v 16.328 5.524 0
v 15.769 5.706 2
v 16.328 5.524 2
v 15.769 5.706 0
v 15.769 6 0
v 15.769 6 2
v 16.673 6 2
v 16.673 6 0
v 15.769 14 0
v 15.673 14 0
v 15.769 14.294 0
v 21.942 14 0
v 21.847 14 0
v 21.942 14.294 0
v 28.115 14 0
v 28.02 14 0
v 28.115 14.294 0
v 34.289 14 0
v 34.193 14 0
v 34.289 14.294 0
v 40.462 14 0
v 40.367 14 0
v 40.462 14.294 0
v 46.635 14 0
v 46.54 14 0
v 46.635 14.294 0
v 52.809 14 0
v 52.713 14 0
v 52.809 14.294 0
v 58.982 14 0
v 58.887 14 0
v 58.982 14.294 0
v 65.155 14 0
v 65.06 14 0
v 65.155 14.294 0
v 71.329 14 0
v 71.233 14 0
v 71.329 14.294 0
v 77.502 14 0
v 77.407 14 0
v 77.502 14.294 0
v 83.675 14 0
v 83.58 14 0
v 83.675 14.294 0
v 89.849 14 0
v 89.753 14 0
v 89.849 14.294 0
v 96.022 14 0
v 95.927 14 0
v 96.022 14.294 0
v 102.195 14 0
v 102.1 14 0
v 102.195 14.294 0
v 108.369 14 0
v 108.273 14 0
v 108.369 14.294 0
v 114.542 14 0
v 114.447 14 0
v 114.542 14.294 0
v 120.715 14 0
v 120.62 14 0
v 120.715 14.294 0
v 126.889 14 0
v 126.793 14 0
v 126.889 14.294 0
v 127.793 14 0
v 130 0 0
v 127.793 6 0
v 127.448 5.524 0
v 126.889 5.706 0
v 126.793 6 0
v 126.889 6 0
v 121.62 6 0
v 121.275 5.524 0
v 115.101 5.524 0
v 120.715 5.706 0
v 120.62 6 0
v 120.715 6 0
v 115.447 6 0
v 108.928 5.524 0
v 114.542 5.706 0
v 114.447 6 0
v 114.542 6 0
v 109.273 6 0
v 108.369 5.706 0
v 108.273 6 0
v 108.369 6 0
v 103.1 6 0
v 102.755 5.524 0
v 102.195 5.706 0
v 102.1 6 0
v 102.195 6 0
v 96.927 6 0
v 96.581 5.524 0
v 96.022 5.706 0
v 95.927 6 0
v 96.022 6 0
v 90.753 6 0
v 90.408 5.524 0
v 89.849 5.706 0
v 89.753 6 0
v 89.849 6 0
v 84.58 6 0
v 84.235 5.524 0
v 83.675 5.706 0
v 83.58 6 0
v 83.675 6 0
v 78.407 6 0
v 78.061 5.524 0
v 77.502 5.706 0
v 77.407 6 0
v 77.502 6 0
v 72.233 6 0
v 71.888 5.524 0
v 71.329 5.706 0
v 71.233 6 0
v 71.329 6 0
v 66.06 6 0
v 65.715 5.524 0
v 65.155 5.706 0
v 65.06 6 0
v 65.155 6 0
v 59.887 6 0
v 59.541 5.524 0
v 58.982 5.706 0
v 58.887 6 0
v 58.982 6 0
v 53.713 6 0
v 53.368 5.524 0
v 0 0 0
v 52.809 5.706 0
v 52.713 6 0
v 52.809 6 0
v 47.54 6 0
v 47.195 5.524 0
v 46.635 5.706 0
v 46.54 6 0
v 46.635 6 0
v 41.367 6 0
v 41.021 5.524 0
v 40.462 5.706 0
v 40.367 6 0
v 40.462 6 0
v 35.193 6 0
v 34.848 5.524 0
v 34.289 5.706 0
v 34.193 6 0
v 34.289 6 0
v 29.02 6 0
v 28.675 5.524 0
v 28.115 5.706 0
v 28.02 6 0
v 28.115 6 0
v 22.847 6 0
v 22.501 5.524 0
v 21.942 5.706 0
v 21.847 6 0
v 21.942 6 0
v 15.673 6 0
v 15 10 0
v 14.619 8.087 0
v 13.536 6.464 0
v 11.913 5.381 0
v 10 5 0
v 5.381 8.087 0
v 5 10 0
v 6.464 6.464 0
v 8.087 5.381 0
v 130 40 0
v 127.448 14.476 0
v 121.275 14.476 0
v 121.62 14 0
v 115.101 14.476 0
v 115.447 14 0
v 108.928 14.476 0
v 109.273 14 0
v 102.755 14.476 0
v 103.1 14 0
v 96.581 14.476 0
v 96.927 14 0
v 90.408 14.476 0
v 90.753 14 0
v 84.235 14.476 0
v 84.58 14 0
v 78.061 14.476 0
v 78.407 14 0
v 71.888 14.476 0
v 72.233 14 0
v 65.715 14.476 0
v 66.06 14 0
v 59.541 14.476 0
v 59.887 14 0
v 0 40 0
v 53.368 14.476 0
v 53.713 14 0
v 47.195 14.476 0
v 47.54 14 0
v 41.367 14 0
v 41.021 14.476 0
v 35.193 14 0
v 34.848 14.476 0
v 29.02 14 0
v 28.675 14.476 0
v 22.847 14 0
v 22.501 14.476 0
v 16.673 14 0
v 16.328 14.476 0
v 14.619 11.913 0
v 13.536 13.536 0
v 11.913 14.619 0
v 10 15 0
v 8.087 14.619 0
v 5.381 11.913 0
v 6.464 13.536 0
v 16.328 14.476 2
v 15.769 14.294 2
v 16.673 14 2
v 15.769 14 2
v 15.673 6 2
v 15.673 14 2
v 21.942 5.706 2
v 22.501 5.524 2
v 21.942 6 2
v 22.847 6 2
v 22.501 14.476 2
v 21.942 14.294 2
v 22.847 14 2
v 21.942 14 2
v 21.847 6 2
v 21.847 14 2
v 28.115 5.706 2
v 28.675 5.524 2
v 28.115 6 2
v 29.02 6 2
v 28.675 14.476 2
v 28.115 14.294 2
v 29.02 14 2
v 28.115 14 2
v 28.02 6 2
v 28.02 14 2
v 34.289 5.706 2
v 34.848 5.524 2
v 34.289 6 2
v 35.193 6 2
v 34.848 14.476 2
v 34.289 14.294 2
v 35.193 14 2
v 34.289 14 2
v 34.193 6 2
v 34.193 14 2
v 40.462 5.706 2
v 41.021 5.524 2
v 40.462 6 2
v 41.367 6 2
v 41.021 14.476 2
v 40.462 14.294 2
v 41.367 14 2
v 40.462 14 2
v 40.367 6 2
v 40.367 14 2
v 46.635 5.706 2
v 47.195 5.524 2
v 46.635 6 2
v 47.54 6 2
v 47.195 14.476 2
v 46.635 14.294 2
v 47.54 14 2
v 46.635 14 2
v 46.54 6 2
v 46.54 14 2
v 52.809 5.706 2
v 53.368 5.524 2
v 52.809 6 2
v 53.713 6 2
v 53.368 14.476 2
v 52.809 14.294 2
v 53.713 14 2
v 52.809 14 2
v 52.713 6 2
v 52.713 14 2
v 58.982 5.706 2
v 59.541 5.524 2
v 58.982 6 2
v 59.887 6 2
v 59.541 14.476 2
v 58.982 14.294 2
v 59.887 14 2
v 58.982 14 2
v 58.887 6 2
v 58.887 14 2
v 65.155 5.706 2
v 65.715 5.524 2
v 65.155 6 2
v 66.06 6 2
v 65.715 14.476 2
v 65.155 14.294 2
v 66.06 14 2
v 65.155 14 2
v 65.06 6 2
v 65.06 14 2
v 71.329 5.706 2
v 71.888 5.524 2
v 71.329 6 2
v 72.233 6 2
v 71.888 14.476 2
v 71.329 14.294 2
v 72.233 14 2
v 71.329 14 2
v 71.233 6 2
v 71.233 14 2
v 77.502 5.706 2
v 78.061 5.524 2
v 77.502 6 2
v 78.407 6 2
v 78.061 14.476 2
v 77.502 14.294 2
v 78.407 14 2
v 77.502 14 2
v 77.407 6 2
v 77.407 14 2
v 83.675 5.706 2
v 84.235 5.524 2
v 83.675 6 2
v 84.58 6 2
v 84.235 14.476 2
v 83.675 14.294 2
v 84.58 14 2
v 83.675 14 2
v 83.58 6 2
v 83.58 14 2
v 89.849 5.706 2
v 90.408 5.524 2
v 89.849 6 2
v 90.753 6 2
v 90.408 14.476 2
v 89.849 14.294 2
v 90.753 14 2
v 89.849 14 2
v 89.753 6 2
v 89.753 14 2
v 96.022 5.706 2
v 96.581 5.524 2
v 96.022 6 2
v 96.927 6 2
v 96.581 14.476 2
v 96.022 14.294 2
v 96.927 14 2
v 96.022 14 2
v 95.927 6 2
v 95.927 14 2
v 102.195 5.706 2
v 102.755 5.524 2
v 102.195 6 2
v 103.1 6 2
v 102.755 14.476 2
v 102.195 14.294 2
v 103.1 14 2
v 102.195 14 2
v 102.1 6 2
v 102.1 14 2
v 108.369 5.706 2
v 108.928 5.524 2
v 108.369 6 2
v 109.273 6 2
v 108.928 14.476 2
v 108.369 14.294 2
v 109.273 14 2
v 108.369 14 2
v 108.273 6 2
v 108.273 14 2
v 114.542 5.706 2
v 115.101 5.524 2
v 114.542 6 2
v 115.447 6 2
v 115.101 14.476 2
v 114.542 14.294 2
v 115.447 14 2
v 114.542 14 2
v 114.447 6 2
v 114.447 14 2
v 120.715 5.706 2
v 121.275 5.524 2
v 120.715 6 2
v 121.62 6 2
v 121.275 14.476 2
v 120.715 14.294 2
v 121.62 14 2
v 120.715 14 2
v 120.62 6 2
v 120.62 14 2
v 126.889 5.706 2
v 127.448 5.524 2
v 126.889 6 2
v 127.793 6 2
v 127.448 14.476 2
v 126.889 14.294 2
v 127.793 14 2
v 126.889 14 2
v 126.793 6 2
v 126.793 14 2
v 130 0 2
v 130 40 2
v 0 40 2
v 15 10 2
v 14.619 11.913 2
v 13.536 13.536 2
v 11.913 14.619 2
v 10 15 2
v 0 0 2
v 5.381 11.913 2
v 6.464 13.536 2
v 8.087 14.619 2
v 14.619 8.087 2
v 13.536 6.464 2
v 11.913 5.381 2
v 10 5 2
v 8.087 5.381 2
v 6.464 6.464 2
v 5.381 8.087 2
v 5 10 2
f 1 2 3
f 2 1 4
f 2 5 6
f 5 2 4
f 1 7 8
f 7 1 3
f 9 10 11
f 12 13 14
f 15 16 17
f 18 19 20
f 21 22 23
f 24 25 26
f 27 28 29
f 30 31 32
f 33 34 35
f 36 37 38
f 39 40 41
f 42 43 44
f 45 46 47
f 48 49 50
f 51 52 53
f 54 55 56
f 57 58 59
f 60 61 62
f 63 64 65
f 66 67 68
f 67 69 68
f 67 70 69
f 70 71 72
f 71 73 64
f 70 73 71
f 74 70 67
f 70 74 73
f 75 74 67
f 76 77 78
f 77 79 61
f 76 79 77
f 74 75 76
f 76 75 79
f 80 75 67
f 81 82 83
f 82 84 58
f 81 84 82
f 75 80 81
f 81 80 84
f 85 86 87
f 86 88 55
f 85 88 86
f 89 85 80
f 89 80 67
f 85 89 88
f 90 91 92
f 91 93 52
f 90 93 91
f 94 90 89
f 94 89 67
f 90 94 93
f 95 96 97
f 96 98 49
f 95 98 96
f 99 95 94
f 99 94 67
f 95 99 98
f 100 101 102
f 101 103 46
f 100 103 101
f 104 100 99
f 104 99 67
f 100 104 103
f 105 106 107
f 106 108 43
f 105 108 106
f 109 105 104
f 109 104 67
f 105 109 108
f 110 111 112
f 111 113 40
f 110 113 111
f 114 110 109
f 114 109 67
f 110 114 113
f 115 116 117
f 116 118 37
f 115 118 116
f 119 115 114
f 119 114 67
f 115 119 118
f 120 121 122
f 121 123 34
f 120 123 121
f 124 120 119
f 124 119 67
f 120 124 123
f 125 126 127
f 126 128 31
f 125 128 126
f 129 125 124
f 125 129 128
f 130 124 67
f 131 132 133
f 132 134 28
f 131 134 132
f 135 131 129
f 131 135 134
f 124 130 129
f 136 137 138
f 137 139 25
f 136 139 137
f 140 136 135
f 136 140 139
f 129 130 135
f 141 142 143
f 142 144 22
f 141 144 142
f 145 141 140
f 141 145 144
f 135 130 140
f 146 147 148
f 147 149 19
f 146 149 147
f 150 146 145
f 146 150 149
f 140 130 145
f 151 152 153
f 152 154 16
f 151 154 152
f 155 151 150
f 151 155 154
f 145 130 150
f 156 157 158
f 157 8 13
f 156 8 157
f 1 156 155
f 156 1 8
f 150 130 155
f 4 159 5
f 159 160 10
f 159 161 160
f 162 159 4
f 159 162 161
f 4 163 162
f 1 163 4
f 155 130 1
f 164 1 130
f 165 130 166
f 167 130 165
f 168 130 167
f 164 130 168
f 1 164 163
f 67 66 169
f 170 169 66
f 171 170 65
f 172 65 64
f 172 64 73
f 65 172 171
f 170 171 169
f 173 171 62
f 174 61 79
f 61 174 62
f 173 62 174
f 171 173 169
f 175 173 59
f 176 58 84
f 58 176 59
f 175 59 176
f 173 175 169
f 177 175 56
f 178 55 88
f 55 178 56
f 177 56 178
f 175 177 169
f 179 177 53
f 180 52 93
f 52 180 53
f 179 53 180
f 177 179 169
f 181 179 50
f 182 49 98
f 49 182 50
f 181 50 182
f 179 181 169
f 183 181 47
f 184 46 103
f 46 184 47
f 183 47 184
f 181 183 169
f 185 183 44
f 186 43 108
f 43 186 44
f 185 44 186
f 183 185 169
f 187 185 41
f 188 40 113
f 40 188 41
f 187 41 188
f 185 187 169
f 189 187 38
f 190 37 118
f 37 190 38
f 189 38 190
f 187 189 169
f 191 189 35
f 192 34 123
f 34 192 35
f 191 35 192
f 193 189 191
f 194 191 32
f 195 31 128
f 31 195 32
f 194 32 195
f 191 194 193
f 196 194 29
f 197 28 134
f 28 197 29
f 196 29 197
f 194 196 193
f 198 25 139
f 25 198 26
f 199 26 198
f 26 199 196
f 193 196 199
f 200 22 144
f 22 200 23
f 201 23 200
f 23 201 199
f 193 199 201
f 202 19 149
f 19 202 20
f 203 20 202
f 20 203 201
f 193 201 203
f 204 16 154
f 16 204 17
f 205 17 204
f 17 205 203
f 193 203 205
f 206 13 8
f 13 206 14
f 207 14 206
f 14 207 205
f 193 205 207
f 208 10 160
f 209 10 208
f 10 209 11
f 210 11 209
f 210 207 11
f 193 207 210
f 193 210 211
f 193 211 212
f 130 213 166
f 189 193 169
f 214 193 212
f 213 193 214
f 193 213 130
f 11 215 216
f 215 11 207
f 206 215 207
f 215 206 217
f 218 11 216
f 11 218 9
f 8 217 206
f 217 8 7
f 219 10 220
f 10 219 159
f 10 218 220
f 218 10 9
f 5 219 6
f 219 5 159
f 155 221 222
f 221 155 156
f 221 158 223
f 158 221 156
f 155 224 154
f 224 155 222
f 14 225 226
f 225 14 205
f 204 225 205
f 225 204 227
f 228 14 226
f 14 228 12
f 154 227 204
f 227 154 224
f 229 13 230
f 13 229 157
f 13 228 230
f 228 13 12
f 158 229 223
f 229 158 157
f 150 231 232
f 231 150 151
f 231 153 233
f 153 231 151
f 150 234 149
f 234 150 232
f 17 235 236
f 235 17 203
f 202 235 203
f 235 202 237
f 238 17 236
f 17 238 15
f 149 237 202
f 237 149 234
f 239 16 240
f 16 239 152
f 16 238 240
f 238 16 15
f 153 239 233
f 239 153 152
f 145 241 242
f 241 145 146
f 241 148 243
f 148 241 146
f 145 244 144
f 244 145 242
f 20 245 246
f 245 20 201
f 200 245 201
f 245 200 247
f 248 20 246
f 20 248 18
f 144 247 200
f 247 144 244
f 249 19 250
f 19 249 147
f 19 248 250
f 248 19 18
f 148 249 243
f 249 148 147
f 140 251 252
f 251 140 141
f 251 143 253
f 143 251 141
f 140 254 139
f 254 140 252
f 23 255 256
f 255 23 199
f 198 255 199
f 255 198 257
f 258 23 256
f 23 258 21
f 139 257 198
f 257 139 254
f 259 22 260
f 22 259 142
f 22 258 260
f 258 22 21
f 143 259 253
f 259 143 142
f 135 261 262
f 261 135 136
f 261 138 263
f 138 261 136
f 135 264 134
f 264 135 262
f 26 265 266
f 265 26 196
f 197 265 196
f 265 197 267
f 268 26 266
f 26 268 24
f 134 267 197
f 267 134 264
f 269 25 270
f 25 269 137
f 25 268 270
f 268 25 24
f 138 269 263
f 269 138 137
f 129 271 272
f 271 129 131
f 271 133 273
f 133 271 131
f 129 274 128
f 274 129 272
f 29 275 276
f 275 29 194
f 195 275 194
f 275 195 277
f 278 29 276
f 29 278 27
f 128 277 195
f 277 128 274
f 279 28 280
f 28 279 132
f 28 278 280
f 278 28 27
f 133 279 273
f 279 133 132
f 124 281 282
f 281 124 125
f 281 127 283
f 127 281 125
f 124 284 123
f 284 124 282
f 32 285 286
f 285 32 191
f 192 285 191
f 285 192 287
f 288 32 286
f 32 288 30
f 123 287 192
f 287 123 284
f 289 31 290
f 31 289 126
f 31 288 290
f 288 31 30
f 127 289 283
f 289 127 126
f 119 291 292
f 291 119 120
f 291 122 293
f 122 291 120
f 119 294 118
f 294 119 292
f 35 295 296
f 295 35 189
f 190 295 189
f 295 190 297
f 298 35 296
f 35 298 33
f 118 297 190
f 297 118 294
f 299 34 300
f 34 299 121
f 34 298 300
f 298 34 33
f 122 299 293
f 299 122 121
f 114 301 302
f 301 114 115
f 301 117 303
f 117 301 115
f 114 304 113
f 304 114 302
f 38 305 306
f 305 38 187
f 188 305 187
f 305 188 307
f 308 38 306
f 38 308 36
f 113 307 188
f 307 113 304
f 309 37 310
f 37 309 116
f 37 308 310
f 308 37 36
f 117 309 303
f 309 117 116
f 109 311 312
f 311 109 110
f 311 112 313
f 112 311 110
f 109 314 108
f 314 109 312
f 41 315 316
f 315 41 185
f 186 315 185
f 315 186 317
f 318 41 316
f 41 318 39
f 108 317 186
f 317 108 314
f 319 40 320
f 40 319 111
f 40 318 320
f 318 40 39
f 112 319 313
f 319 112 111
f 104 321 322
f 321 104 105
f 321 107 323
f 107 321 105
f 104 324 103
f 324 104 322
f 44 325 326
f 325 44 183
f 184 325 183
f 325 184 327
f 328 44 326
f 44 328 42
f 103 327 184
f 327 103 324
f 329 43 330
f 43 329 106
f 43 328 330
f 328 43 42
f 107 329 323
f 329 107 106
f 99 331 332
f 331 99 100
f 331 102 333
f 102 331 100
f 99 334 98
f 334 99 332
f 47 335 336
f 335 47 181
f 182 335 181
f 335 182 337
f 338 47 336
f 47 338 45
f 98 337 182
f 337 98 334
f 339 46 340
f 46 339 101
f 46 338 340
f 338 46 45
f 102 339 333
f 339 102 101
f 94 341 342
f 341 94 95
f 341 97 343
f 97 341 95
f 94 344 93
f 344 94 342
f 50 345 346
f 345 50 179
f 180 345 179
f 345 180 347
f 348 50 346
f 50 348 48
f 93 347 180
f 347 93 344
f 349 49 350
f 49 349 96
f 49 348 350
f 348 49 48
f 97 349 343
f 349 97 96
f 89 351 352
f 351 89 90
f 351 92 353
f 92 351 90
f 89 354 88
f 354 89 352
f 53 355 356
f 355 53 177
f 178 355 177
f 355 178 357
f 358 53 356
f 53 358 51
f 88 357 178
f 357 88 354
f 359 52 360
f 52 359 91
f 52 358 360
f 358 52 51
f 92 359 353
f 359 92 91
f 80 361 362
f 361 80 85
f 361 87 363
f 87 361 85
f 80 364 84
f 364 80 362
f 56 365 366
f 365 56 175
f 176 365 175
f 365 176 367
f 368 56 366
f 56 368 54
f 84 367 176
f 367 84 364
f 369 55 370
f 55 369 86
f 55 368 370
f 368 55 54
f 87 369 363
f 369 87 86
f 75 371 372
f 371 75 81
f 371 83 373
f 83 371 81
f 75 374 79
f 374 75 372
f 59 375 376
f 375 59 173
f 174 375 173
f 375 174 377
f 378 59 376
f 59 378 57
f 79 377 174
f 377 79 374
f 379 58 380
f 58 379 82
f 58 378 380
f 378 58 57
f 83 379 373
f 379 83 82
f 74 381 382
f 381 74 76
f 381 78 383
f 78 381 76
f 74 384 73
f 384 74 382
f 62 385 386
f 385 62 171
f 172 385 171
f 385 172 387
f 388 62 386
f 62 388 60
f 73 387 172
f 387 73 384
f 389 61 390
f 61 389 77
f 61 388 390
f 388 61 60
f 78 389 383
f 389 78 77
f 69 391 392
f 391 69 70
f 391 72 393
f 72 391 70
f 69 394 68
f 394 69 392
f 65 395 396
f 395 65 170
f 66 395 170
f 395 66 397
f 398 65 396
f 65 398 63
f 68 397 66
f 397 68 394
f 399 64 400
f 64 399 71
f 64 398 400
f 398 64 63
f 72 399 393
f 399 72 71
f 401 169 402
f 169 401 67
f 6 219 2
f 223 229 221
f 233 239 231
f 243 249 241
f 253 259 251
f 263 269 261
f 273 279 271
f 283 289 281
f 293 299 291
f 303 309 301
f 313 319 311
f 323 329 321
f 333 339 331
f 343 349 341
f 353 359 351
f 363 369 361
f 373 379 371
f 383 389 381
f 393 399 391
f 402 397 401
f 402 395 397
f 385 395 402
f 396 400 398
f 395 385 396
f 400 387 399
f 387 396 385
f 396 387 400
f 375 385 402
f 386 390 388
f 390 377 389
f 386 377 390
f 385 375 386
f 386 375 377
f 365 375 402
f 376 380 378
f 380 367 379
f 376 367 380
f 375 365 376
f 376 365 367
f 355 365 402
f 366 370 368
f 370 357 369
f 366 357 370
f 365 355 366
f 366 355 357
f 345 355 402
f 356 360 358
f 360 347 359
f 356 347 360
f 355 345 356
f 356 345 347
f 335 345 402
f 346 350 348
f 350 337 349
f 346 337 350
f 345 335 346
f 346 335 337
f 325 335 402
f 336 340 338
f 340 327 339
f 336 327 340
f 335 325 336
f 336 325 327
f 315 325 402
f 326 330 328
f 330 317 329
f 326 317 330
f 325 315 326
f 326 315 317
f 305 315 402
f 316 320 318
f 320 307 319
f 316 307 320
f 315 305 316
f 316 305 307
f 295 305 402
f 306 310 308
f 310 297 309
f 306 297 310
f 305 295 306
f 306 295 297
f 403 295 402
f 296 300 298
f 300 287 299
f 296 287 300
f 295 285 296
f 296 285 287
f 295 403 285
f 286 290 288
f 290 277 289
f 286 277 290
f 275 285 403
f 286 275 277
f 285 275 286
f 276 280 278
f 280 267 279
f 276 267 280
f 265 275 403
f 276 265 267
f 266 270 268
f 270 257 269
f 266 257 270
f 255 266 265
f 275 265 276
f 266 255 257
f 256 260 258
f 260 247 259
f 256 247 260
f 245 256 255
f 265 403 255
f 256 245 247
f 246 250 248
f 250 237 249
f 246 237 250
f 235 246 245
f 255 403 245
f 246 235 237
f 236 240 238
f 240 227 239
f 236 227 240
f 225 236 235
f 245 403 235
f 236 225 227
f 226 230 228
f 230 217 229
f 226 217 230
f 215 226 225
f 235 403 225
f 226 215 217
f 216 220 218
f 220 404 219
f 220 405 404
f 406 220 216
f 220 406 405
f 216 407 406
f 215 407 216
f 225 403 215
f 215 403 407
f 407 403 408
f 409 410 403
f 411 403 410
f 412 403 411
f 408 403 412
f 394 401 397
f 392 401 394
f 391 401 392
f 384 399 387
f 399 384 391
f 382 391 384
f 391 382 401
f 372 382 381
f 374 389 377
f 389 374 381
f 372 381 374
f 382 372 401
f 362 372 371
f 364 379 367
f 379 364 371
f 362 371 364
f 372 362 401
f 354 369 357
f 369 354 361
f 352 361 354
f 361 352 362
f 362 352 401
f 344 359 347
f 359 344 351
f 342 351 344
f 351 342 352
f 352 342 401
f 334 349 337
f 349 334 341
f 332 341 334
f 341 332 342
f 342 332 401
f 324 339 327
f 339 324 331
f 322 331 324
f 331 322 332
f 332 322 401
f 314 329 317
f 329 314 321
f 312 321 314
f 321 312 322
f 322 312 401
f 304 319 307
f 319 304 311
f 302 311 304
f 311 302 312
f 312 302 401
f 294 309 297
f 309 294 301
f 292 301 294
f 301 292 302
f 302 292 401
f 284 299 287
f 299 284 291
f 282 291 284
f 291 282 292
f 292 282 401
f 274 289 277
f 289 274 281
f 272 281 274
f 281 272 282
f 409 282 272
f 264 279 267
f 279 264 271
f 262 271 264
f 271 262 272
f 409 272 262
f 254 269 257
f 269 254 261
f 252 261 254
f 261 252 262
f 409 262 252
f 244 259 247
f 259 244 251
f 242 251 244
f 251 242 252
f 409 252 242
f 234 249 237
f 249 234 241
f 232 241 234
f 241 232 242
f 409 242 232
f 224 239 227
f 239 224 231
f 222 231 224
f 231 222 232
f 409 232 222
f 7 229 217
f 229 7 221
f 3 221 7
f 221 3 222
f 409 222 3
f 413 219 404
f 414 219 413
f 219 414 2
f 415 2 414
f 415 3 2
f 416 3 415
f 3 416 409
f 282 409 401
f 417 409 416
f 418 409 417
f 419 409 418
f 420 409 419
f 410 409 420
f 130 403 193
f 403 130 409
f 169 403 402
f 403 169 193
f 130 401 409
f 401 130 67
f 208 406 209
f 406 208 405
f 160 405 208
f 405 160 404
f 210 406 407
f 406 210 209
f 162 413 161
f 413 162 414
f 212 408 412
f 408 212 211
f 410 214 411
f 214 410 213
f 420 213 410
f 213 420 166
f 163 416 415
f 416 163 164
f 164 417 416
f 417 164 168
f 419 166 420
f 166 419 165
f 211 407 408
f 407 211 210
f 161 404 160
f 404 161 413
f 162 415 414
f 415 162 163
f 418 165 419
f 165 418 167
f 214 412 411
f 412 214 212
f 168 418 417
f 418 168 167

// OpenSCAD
ruler_size_lengh=130;
ruler_size_width=40;
ruler_size_hight=2;


pon_radius = 10;
pon_offsetX = 10;
pon_offsetY = 10;

fente_width=8;
fente_size=1;

//Vitesse en kts
speed=100;
map_scale=500000;
one_minute_lengh= (1/60)*speed*1.852*1000000/map_scale;

//nombre de fentes
nb_fentes = ruler_size_lengh/one_minute_lengh;



difference(){
    
    //Ruler base
    cube([ruler_size_lengh,ruler_size_width,ruler_size_hight]);
    
//PON
    translate([pon_offsetX,pon_offsetY,0])
        cylinder(h=ruler_size_hight*2+1,r=5,center=true);
  for (i=[1:1:nb_fentes]) {
        dx = i*one_minute_lengh;
      
//Fente cylindre gauche
        translate([pon_offsetX,pon_offsetY-fente_width/2,0])
        translate([dx,0,0])
            cylinder(h=ruler_size_hight*2+1,r=fente_size/2,center=false);
      
//Fente cylindre droit
        translate([pon_offsetX,pon_offsetY+fente_width/2,0])
        translate([dx,0,0])
            cylinder(h=ruler_size_hight*2+1,r=fente_size/2,center=true);
//Fente rectangle
        translate([pon_offsetX,pon_offsetY,0])
        translate([dx,0,0])
            cube([fente_size,fente_width,5],center=true);
 
    }
  
    
    

}


 
